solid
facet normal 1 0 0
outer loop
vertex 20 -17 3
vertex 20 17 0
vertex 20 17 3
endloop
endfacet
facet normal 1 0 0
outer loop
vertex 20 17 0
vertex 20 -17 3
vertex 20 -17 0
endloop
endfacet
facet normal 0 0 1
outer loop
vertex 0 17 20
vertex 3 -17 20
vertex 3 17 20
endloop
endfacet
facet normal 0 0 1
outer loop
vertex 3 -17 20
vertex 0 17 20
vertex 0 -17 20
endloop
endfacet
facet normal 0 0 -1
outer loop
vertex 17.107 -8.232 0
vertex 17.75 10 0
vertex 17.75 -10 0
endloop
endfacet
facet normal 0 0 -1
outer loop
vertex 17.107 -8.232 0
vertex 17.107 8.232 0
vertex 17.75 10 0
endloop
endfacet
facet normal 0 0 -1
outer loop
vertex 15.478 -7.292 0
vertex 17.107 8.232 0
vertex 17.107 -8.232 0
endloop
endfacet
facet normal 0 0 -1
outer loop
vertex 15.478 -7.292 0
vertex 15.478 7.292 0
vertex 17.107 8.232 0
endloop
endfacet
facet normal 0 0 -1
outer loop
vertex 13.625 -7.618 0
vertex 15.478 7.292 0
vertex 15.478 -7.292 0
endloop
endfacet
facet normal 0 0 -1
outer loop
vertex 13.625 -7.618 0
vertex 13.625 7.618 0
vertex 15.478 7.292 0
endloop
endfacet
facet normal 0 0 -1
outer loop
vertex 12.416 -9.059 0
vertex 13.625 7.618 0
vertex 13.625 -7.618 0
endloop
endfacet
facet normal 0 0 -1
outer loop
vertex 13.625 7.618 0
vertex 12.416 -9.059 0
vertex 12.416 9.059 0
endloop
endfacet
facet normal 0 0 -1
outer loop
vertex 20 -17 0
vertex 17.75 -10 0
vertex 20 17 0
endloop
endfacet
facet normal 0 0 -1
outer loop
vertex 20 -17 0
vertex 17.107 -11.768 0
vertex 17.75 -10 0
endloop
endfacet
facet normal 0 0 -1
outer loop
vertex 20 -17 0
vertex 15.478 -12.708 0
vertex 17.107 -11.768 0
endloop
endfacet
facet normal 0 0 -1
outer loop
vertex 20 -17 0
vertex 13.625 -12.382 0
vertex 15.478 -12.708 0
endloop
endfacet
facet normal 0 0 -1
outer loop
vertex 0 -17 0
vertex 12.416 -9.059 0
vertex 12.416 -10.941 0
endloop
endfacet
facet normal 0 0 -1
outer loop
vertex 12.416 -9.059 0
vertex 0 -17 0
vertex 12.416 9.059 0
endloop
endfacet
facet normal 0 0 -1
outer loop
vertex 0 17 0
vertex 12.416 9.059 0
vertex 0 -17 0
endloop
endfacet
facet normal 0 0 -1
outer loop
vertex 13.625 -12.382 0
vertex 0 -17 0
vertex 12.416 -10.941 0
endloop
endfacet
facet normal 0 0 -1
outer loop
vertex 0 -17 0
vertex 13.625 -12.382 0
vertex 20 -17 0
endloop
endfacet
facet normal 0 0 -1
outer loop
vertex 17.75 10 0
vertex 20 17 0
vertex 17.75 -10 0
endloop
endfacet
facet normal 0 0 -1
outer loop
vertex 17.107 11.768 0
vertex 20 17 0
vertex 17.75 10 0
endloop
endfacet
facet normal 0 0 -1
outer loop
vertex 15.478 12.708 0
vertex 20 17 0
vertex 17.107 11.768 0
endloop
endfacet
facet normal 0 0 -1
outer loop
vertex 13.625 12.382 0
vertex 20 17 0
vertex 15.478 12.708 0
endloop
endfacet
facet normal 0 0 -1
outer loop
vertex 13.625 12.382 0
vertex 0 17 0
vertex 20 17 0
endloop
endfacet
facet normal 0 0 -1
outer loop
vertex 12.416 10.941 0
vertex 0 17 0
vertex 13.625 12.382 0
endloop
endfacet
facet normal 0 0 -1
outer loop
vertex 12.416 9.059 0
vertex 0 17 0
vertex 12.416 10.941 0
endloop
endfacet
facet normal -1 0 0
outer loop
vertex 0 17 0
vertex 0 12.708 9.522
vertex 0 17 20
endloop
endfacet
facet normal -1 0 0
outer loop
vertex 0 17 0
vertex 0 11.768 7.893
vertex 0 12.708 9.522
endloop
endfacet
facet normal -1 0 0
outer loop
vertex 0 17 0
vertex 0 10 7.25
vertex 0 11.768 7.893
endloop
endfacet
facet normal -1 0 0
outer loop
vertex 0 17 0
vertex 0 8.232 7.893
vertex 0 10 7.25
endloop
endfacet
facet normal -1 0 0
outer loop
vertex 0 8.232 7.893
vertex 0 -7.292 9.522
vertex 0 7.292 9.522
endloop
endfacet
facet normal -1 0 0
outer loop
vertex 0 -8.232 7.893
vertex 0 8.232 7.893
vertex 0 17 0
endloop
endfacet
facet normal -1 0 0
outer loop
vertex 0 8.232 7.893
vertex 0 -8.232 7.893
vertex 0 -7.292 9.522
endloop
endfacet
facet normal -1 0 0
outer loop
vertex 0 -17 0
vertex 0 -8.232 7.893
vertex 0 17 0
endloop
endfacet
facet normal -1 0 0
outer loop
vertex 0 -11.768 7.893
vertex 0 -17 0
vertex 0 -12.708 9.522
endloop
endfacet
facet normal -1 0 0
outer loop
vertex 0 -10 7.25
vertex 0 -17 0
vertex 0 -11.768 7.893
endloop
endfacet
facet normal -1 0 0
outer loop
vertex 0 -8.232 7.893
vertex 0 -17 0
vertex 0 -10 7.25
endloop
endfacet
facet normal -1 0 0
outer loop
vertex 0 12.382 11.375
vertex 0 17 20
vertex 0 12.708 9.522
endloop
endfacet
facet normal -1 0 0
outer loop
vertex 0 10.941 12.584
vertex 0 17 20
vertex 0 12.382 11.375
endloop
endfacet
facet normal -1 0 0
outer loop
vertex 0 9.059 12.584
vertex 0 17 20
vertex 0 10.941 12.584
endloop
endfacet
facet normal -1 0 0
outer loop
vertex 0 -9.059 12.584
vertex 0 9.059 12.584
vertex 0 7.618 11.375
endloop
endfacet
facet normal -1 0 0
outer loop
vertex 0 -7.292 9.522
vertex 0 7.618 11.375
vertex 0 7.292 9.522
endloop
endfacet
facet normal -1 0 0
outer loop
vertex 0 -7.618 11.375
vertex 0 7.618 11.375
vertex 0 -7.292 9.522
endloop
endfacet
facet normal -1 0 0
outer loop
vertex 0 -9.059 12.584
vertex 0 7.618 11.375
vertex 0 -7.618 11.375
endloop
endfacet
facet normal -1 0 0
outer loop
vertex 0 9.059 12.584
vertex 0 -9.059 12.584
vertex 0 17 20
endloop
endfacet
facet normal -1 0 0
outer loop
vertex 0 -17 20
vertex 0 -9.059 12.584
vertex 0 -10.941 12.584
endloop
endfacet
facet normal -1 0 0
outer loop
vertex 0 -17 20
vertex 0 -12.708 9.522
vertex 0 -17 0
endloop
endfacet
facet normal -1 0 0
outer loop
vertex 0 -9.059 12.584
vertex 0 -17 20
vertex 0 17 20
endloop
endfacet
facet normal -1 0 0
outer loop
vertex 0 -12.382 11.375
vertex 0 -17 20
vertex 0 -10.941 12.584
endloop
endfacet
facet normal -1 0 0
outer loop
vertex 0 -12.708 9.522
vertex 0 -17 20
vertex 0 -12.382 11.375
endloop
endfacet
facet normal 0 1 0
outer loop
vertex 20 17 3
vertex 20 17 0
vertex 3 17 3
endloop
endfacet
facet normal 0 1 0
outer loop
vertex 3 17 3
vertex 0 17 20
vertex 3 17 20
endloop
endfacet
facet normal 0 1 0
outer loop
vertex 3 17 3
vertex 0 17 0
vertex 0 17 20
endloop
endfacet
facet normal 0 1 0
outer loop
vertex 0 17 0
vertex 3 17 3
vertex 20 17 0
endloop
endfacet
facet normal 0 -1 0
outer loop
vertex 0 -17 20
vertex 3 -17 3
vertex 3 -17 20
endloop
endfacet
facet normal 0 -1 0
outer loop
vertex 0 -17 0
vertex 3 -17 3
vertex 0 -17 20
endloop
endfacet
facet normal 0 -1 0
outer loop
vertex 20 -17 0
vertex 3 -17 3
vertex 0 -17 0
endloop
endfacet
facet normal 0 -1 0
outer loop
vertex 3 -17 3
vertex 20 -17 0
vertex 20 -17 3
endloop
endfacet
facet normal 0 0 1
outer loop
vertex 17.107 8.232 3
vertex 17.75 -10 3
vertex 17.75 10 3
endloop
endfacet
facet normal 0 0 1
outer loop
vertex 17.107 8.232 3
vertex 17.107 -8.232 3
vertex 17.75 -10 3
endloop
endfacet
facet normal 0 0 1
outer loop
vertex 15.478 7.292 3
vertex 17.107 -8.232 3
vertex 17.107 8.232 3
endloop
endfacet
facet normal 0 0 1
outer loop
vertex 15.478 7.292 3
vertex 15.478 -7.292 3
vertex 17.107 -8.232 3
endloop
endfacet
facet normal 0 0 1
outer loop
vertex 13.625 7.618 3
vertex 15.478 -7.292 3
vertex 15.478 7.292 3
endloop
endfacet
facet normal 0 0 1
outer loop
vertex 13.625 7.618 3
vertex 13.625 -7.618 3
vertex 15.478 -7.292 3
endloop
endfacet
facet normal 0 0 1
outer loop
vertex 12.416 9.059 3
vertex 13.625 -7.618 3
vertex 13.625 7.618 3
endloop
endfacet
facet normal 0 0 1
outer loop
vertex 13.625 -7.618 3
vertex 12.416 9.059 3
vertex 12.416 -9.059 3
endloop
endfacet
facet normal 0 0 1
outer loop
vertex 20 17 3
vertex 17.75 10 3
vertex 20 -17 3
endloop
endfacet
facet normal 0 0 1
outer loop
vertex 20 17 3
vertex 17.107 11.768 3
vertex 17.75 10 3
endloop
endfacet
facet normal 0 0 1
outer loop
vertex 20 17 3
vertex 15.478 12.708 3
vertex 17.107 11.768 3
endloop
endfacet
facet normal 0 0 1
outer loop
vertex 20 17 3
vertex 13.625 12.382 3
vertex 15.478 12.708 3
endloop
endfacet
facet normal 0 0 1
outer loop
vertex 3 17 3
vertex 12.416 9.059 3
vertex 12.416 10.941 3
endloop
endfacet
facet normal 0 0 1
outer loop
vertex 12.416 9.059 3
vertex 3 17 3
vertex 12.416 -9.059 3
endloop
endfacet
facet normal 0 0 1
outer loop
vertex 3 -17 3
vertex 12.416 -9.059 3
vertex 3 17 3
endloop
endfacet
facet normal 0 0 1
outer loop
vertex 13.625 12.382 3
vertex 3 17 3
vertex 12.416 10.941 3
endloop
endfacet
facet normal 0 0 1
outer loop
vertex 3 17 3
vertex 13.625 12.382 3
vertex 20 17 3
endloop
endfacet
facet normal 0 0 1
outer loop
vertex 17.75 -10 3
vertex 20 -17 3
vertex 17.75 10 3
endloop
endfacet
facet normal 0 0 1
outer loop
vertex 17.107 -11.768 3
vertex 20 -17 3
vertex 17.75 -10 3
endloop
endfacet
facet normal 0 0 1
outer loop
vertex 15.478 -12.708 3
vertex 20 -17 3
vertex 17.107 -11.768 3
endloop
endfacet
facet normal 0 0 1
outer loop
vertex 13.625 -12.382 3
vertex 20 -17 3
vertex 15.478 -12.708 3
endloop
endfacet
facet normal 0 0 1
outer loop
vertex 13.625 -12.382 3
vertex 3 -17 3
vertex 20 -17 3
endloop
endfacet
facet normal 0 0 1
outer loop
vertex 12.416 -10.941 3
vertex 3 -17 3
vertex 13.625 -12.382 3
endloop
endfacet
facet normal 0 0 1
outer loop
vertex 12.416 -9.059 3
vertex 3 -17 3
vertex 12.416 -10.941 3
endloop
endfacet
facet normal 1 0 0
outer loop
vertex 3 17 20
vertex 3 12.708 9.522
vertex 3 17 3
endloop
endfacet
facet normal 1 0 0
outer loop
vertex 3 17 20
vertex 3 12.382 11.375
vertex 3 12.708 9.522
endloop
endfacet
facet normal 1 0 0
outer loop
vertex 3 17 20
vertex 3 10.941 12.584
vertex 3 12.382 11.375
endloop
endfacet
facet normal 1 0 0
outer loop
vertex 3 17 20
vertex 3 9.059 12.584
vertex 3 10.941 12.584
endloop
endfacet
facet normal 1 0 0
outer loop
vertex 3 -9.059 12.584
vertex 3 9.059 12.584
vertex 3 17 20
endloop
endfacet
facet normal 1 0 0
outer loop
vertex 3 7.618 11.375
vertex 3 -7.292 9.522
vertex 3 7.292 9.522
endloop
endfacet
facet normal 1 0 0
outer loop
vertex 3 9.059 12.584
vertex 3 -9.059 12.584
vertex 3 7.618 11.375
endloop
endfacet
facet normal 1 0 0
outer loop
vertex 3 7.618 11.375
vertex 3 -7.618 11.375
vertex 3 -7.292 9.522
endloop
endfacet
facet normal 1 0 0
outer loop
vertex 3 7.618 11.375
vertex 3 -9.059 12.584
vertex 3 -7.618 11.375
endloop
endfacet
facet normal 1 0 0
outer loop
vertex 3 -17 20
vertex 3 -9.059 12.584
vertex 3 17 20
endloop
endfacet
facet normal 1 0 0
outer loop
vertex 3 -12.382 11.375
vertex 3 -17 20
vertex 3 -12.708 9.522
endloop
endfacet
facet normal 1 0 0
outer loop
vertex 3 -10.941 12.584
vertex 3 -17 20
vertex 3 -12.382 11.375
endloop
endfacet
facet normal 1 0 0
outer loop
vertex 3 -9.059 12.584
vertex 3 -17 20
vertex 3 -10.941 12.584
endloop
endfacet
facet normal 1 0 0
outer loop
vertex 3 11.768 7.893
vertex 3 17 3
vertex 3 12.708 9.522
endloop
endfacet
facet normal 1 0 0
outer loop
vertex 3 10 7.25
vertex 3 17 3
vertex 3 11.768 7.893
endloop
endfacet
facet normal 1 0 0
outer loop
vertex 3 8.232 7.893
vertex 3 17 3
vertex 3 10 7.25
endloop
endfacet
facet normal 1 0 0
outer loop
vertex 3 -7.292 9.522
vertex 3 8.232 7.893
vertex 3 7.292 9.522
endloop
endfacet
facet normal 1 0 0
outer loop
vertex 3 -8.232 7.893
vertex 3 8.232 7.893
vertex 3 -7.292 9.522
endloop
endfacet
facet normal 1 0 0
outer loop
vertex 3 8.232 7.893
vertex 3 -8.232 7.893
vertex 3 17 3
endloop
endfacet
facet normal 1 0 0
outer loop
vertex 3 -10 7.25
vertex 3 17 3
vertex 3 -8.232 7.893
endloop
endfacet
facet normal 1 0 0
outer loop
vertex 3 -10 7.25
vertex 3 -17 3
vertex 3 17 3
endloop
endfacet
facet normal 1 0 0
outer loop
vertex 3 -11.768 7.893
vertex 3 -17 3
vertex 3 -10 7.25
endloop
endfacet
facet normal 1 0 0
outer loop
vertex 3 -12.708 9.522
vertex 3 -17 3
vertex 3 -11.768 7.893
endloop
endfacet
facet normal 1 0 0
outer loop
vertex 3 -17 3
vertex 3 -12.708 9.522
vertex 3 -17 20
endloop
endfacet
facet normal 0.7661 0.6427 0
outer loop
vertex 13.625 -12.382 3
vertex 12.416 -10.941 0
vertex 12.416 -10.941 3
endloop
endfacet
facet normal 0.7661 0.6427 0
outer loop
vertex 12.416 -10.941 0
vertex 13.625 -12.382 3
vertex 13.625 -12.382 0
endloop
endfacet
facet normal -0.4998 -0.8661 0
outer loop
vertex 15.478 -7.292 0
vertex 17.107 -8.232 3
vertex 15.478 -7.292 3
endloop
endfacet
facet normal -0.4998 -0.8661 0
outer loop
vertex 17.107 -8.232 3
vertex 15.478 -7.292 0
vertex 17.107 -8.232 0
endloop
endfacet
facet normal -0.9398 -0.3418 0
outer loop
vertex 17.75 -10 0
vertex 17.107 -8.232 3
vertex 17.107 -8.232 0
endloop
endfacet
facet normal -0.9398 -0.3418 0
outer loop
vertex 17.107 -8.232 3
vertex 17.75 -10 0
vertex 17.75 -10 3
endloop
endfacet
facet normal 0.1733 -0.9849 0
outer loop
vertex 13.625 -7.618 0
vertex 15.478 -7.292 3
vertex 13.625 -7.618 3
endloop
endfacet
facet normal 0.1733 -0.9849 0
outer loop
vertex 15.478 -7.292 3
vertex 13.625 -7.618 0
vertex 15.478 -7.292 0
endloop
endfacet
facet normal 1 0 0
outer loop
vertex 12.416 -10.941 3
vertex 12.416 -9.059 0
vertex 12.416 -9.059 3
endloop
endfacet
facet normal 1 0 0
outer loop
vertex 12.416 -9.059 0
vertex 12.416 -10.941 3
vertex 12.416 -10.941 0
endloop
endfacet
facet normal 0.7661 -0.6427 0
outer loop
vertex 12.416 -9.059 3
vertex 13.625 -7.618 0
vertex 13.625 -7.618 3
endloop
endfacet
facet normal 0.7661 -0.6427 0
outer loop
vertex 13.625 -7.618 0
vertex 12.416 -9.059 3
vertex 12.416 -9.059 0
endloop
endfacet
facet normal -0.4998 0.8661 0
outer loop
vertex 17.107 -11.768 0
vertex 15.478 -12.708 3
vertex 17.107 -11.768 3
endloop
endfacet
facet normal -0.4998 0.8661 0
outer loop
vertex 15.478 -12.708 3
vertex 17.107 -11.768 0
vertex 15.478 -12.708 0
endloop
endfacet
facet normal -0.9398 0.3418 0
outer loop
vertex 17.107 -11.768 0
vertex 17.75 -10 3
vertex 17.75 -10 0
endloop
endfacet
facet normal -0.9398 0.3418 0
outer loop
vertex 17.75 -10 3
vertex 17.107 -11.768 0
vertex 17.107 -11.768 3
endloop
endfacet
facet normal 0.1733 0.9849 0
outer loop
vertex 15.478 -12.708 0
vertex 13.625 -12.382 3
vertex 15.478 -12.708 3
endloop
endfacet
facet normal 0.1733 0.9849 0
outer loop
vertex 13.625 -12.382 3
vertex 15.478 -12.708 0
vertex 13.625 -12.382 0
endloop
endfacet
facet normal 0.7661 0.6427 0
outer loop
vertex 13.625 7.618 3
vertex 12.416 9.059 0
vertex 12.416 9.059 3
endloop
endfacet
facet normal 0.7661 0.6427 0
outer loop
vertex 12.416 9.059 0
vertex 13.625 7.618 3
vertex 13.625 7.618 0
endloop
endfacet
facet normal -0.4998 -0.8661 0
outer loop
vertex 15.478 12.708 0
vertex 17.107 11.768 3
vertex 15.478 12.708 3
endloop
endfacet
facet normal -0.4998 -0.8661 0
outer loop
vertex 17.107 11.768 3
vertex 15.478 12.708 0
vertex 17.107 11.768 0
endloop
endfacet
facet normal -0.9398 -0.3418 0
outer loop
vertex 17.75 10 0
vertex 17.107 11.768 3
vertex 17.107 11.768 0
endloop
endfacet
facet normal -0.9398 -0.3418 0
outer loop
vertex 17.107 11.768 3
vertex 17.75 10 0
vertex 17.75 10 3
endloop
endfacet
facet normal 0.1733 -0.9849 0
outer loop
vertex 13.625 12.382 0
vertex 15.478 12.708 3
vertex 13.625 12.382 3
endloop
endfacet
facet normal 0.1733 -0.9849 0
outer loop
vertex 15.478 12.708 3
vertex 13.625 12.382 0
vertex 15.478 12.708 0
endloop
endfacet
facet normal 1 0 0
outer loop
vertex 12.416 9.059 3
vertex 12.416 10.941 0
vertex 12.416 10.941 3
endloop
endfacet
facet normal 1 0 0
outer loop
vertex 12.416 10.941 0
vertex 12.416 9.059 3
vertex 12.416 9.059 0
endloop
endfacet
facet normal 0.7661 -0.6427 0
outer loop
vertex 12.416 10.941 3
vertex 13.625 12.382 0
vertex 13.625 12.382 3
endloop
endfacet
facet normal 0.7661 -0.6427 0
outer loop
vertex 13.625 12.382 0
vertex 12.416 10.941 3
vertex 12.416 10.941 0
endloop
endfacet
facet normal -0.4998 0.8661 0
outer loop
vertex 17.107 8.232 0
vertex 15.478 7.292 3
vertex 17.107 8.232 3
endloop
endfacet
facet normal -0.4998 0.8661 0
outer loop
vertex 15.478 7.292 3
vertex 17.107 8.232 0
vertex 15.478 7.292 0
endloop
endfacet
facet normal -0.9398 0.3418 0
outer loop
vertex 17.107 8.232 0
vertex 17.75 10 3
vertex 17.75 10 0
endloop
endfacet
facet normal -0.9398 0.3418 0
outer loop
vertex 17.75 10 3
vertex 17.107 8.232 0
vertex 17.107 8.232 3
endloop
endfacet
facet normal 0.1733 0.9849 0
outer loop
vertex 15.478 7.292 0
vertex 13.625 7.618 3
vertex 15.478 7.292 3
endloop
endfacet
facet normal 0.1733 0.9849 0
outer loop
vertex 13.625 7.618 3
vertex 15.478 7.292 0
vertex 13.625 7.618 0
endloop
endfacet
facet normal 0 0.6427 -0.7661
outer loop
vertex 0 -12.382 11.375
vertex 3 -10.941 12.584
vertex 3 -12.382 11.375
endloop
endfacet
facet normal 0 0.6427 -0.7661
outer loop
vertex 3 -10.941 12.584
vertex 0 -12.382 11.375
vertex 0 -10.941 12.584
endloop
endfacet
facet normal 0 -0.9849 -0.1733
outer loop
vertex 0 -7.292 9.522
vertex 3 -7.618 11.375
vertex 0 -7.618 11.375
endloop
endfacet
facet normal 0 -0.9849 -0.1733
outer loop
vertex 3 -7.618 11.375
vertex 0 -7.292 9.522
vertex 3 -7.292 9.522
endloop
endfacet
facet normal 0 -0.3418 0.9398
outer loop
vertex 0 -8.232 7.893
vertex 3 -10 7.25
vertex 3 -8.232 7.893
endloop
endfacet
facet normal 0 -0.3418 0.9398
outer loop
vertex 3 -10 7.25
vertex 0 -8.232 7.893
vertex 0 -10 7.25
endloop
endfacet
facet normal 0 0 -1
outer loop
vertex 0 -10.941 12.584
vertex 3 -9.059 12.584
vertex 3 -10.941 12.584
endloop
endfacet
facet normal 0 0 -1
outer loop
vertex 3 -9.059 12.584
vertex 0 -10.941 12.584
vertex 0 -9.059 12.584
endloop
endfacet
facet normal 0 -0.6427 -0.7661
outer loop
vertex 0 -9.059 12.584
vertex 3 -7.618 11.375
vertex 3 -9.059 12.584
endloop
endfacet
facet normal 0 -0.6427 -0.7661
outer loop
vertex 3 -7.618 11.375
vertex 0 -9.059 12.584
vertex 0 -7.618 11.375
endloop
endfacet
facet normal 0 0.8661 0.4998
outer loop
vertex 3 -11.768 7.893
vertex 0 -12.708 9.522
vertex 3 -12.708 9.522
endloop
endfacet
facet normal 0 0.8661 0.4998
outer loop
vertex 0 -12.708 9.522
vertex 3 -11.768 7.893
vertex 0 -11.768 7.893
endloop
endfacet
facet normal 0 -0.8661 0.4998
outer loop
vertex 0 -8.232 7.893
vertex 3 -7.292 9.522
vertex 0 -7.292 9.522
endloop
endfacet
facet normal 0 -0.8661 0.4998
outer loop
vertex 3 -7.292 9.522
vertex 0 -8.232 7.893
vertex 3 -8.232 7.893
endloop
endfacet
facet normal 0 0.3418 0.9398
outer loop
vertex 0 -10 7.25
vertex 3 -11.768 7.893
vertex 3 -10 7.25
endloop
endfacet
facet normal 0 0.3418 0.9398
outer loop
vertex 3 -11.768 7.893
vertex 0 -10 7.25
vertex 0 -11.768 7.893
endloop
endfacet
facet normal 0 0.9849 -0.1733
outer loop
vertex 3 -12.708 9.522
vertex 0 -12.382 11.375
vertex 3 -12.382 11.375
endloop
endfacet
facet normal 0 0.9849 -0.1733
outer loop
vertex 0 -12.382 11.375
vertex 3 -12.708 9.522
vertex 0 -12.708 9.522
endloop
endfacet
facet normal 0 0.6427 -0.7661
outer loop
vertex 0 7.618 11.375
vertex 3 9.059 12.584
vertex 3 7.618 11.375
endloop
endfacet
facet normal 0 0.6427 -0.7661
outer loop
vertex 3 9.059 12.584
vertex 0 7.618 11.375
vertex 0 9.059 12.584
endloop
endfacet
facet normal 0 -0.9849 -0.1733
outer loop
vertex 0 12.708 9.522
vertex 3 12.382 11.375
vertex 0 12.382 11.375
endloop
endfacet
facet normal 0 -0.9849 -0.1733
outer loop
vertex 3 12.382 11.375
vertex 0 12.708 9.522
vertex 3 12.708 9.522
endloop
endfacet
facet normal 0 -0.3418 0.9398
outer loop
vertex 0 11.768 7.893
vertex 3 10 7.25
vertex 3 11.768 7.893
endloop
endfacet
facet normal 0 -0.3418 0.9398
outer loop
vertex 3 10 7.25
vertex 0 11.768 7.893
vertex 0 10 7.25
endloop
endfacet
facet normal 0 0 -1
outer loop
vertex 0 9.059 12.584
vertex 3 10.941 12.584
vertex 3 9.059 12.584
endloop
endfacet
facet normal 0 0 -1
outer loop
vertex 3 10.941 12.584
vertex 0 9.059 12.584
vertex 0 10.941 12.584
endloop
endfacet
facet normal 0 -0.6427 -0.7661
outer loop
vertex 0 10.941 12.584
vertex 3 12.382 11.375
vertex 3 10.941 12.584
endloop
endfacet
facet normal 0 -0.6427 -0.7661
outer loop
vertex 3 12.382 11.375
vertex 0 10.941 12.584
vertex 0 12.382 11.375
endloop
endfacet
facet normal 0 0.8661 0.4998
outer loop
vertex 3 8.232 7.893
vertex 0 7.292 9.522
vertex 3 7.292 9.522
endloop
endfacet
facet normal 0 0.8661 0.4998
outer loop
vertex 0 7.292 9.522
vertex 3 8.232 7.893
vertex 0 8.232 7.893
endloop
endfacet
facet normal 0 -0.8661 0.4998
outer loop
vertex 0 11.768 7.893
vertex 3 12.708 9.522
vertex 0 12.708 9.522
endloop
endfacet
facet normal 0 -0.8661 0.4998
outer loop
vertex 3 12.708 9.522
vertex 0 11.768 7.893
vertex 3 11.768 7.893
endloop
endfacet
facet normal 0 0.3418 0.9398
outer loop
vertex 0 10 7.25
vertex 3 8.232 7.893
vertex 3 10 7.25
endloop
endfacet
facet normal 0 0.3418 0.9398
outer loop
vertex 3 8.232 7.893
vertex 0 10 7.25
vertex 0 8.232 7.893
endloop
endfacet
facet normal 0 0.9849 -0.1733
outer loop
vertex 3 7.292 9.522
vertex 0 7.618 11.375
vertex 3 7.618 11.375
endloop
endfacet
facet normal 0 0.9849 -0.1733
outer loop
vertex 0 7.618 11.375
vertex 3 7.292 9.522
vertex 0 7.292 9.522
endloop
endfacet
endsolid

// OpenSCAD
///////////////////////////////////////////////////////////////////////////////////
// Parts for building a 3D Printer with aluminium extrusions an makerslide parts //
//                                                                               //
//  These are simple parts for using with FreeCAD (openscad module needed.       //
//  The parts are refined inside FreeCAD                                         //
//                                                                               //
//  (c) Holger Pasligh                                                           //
//  You can use this parts for your own purpose, as long you did not sell them   //
//                                                                               //
///////////////////////////////////////////////////////////////////////////////////


//alu mounting part
// source myhobby-cnc.de

difference(){
translate([0,-17,0])cube([20,34,20]);
translate([3,-18,3])cube([20,36,20]);
translate([15,-10,-1])cylinder(d=5.5, h=5);
translate([15,10,-1])cylinder(d=5.5, h=5);
translate([-1,-10,10])rotate([0,90,0])cylinder(d=5.5, h=5);
translate([-1,10,10])rotate([0,90,0])cylinder(d=5.5, h=5);
}
